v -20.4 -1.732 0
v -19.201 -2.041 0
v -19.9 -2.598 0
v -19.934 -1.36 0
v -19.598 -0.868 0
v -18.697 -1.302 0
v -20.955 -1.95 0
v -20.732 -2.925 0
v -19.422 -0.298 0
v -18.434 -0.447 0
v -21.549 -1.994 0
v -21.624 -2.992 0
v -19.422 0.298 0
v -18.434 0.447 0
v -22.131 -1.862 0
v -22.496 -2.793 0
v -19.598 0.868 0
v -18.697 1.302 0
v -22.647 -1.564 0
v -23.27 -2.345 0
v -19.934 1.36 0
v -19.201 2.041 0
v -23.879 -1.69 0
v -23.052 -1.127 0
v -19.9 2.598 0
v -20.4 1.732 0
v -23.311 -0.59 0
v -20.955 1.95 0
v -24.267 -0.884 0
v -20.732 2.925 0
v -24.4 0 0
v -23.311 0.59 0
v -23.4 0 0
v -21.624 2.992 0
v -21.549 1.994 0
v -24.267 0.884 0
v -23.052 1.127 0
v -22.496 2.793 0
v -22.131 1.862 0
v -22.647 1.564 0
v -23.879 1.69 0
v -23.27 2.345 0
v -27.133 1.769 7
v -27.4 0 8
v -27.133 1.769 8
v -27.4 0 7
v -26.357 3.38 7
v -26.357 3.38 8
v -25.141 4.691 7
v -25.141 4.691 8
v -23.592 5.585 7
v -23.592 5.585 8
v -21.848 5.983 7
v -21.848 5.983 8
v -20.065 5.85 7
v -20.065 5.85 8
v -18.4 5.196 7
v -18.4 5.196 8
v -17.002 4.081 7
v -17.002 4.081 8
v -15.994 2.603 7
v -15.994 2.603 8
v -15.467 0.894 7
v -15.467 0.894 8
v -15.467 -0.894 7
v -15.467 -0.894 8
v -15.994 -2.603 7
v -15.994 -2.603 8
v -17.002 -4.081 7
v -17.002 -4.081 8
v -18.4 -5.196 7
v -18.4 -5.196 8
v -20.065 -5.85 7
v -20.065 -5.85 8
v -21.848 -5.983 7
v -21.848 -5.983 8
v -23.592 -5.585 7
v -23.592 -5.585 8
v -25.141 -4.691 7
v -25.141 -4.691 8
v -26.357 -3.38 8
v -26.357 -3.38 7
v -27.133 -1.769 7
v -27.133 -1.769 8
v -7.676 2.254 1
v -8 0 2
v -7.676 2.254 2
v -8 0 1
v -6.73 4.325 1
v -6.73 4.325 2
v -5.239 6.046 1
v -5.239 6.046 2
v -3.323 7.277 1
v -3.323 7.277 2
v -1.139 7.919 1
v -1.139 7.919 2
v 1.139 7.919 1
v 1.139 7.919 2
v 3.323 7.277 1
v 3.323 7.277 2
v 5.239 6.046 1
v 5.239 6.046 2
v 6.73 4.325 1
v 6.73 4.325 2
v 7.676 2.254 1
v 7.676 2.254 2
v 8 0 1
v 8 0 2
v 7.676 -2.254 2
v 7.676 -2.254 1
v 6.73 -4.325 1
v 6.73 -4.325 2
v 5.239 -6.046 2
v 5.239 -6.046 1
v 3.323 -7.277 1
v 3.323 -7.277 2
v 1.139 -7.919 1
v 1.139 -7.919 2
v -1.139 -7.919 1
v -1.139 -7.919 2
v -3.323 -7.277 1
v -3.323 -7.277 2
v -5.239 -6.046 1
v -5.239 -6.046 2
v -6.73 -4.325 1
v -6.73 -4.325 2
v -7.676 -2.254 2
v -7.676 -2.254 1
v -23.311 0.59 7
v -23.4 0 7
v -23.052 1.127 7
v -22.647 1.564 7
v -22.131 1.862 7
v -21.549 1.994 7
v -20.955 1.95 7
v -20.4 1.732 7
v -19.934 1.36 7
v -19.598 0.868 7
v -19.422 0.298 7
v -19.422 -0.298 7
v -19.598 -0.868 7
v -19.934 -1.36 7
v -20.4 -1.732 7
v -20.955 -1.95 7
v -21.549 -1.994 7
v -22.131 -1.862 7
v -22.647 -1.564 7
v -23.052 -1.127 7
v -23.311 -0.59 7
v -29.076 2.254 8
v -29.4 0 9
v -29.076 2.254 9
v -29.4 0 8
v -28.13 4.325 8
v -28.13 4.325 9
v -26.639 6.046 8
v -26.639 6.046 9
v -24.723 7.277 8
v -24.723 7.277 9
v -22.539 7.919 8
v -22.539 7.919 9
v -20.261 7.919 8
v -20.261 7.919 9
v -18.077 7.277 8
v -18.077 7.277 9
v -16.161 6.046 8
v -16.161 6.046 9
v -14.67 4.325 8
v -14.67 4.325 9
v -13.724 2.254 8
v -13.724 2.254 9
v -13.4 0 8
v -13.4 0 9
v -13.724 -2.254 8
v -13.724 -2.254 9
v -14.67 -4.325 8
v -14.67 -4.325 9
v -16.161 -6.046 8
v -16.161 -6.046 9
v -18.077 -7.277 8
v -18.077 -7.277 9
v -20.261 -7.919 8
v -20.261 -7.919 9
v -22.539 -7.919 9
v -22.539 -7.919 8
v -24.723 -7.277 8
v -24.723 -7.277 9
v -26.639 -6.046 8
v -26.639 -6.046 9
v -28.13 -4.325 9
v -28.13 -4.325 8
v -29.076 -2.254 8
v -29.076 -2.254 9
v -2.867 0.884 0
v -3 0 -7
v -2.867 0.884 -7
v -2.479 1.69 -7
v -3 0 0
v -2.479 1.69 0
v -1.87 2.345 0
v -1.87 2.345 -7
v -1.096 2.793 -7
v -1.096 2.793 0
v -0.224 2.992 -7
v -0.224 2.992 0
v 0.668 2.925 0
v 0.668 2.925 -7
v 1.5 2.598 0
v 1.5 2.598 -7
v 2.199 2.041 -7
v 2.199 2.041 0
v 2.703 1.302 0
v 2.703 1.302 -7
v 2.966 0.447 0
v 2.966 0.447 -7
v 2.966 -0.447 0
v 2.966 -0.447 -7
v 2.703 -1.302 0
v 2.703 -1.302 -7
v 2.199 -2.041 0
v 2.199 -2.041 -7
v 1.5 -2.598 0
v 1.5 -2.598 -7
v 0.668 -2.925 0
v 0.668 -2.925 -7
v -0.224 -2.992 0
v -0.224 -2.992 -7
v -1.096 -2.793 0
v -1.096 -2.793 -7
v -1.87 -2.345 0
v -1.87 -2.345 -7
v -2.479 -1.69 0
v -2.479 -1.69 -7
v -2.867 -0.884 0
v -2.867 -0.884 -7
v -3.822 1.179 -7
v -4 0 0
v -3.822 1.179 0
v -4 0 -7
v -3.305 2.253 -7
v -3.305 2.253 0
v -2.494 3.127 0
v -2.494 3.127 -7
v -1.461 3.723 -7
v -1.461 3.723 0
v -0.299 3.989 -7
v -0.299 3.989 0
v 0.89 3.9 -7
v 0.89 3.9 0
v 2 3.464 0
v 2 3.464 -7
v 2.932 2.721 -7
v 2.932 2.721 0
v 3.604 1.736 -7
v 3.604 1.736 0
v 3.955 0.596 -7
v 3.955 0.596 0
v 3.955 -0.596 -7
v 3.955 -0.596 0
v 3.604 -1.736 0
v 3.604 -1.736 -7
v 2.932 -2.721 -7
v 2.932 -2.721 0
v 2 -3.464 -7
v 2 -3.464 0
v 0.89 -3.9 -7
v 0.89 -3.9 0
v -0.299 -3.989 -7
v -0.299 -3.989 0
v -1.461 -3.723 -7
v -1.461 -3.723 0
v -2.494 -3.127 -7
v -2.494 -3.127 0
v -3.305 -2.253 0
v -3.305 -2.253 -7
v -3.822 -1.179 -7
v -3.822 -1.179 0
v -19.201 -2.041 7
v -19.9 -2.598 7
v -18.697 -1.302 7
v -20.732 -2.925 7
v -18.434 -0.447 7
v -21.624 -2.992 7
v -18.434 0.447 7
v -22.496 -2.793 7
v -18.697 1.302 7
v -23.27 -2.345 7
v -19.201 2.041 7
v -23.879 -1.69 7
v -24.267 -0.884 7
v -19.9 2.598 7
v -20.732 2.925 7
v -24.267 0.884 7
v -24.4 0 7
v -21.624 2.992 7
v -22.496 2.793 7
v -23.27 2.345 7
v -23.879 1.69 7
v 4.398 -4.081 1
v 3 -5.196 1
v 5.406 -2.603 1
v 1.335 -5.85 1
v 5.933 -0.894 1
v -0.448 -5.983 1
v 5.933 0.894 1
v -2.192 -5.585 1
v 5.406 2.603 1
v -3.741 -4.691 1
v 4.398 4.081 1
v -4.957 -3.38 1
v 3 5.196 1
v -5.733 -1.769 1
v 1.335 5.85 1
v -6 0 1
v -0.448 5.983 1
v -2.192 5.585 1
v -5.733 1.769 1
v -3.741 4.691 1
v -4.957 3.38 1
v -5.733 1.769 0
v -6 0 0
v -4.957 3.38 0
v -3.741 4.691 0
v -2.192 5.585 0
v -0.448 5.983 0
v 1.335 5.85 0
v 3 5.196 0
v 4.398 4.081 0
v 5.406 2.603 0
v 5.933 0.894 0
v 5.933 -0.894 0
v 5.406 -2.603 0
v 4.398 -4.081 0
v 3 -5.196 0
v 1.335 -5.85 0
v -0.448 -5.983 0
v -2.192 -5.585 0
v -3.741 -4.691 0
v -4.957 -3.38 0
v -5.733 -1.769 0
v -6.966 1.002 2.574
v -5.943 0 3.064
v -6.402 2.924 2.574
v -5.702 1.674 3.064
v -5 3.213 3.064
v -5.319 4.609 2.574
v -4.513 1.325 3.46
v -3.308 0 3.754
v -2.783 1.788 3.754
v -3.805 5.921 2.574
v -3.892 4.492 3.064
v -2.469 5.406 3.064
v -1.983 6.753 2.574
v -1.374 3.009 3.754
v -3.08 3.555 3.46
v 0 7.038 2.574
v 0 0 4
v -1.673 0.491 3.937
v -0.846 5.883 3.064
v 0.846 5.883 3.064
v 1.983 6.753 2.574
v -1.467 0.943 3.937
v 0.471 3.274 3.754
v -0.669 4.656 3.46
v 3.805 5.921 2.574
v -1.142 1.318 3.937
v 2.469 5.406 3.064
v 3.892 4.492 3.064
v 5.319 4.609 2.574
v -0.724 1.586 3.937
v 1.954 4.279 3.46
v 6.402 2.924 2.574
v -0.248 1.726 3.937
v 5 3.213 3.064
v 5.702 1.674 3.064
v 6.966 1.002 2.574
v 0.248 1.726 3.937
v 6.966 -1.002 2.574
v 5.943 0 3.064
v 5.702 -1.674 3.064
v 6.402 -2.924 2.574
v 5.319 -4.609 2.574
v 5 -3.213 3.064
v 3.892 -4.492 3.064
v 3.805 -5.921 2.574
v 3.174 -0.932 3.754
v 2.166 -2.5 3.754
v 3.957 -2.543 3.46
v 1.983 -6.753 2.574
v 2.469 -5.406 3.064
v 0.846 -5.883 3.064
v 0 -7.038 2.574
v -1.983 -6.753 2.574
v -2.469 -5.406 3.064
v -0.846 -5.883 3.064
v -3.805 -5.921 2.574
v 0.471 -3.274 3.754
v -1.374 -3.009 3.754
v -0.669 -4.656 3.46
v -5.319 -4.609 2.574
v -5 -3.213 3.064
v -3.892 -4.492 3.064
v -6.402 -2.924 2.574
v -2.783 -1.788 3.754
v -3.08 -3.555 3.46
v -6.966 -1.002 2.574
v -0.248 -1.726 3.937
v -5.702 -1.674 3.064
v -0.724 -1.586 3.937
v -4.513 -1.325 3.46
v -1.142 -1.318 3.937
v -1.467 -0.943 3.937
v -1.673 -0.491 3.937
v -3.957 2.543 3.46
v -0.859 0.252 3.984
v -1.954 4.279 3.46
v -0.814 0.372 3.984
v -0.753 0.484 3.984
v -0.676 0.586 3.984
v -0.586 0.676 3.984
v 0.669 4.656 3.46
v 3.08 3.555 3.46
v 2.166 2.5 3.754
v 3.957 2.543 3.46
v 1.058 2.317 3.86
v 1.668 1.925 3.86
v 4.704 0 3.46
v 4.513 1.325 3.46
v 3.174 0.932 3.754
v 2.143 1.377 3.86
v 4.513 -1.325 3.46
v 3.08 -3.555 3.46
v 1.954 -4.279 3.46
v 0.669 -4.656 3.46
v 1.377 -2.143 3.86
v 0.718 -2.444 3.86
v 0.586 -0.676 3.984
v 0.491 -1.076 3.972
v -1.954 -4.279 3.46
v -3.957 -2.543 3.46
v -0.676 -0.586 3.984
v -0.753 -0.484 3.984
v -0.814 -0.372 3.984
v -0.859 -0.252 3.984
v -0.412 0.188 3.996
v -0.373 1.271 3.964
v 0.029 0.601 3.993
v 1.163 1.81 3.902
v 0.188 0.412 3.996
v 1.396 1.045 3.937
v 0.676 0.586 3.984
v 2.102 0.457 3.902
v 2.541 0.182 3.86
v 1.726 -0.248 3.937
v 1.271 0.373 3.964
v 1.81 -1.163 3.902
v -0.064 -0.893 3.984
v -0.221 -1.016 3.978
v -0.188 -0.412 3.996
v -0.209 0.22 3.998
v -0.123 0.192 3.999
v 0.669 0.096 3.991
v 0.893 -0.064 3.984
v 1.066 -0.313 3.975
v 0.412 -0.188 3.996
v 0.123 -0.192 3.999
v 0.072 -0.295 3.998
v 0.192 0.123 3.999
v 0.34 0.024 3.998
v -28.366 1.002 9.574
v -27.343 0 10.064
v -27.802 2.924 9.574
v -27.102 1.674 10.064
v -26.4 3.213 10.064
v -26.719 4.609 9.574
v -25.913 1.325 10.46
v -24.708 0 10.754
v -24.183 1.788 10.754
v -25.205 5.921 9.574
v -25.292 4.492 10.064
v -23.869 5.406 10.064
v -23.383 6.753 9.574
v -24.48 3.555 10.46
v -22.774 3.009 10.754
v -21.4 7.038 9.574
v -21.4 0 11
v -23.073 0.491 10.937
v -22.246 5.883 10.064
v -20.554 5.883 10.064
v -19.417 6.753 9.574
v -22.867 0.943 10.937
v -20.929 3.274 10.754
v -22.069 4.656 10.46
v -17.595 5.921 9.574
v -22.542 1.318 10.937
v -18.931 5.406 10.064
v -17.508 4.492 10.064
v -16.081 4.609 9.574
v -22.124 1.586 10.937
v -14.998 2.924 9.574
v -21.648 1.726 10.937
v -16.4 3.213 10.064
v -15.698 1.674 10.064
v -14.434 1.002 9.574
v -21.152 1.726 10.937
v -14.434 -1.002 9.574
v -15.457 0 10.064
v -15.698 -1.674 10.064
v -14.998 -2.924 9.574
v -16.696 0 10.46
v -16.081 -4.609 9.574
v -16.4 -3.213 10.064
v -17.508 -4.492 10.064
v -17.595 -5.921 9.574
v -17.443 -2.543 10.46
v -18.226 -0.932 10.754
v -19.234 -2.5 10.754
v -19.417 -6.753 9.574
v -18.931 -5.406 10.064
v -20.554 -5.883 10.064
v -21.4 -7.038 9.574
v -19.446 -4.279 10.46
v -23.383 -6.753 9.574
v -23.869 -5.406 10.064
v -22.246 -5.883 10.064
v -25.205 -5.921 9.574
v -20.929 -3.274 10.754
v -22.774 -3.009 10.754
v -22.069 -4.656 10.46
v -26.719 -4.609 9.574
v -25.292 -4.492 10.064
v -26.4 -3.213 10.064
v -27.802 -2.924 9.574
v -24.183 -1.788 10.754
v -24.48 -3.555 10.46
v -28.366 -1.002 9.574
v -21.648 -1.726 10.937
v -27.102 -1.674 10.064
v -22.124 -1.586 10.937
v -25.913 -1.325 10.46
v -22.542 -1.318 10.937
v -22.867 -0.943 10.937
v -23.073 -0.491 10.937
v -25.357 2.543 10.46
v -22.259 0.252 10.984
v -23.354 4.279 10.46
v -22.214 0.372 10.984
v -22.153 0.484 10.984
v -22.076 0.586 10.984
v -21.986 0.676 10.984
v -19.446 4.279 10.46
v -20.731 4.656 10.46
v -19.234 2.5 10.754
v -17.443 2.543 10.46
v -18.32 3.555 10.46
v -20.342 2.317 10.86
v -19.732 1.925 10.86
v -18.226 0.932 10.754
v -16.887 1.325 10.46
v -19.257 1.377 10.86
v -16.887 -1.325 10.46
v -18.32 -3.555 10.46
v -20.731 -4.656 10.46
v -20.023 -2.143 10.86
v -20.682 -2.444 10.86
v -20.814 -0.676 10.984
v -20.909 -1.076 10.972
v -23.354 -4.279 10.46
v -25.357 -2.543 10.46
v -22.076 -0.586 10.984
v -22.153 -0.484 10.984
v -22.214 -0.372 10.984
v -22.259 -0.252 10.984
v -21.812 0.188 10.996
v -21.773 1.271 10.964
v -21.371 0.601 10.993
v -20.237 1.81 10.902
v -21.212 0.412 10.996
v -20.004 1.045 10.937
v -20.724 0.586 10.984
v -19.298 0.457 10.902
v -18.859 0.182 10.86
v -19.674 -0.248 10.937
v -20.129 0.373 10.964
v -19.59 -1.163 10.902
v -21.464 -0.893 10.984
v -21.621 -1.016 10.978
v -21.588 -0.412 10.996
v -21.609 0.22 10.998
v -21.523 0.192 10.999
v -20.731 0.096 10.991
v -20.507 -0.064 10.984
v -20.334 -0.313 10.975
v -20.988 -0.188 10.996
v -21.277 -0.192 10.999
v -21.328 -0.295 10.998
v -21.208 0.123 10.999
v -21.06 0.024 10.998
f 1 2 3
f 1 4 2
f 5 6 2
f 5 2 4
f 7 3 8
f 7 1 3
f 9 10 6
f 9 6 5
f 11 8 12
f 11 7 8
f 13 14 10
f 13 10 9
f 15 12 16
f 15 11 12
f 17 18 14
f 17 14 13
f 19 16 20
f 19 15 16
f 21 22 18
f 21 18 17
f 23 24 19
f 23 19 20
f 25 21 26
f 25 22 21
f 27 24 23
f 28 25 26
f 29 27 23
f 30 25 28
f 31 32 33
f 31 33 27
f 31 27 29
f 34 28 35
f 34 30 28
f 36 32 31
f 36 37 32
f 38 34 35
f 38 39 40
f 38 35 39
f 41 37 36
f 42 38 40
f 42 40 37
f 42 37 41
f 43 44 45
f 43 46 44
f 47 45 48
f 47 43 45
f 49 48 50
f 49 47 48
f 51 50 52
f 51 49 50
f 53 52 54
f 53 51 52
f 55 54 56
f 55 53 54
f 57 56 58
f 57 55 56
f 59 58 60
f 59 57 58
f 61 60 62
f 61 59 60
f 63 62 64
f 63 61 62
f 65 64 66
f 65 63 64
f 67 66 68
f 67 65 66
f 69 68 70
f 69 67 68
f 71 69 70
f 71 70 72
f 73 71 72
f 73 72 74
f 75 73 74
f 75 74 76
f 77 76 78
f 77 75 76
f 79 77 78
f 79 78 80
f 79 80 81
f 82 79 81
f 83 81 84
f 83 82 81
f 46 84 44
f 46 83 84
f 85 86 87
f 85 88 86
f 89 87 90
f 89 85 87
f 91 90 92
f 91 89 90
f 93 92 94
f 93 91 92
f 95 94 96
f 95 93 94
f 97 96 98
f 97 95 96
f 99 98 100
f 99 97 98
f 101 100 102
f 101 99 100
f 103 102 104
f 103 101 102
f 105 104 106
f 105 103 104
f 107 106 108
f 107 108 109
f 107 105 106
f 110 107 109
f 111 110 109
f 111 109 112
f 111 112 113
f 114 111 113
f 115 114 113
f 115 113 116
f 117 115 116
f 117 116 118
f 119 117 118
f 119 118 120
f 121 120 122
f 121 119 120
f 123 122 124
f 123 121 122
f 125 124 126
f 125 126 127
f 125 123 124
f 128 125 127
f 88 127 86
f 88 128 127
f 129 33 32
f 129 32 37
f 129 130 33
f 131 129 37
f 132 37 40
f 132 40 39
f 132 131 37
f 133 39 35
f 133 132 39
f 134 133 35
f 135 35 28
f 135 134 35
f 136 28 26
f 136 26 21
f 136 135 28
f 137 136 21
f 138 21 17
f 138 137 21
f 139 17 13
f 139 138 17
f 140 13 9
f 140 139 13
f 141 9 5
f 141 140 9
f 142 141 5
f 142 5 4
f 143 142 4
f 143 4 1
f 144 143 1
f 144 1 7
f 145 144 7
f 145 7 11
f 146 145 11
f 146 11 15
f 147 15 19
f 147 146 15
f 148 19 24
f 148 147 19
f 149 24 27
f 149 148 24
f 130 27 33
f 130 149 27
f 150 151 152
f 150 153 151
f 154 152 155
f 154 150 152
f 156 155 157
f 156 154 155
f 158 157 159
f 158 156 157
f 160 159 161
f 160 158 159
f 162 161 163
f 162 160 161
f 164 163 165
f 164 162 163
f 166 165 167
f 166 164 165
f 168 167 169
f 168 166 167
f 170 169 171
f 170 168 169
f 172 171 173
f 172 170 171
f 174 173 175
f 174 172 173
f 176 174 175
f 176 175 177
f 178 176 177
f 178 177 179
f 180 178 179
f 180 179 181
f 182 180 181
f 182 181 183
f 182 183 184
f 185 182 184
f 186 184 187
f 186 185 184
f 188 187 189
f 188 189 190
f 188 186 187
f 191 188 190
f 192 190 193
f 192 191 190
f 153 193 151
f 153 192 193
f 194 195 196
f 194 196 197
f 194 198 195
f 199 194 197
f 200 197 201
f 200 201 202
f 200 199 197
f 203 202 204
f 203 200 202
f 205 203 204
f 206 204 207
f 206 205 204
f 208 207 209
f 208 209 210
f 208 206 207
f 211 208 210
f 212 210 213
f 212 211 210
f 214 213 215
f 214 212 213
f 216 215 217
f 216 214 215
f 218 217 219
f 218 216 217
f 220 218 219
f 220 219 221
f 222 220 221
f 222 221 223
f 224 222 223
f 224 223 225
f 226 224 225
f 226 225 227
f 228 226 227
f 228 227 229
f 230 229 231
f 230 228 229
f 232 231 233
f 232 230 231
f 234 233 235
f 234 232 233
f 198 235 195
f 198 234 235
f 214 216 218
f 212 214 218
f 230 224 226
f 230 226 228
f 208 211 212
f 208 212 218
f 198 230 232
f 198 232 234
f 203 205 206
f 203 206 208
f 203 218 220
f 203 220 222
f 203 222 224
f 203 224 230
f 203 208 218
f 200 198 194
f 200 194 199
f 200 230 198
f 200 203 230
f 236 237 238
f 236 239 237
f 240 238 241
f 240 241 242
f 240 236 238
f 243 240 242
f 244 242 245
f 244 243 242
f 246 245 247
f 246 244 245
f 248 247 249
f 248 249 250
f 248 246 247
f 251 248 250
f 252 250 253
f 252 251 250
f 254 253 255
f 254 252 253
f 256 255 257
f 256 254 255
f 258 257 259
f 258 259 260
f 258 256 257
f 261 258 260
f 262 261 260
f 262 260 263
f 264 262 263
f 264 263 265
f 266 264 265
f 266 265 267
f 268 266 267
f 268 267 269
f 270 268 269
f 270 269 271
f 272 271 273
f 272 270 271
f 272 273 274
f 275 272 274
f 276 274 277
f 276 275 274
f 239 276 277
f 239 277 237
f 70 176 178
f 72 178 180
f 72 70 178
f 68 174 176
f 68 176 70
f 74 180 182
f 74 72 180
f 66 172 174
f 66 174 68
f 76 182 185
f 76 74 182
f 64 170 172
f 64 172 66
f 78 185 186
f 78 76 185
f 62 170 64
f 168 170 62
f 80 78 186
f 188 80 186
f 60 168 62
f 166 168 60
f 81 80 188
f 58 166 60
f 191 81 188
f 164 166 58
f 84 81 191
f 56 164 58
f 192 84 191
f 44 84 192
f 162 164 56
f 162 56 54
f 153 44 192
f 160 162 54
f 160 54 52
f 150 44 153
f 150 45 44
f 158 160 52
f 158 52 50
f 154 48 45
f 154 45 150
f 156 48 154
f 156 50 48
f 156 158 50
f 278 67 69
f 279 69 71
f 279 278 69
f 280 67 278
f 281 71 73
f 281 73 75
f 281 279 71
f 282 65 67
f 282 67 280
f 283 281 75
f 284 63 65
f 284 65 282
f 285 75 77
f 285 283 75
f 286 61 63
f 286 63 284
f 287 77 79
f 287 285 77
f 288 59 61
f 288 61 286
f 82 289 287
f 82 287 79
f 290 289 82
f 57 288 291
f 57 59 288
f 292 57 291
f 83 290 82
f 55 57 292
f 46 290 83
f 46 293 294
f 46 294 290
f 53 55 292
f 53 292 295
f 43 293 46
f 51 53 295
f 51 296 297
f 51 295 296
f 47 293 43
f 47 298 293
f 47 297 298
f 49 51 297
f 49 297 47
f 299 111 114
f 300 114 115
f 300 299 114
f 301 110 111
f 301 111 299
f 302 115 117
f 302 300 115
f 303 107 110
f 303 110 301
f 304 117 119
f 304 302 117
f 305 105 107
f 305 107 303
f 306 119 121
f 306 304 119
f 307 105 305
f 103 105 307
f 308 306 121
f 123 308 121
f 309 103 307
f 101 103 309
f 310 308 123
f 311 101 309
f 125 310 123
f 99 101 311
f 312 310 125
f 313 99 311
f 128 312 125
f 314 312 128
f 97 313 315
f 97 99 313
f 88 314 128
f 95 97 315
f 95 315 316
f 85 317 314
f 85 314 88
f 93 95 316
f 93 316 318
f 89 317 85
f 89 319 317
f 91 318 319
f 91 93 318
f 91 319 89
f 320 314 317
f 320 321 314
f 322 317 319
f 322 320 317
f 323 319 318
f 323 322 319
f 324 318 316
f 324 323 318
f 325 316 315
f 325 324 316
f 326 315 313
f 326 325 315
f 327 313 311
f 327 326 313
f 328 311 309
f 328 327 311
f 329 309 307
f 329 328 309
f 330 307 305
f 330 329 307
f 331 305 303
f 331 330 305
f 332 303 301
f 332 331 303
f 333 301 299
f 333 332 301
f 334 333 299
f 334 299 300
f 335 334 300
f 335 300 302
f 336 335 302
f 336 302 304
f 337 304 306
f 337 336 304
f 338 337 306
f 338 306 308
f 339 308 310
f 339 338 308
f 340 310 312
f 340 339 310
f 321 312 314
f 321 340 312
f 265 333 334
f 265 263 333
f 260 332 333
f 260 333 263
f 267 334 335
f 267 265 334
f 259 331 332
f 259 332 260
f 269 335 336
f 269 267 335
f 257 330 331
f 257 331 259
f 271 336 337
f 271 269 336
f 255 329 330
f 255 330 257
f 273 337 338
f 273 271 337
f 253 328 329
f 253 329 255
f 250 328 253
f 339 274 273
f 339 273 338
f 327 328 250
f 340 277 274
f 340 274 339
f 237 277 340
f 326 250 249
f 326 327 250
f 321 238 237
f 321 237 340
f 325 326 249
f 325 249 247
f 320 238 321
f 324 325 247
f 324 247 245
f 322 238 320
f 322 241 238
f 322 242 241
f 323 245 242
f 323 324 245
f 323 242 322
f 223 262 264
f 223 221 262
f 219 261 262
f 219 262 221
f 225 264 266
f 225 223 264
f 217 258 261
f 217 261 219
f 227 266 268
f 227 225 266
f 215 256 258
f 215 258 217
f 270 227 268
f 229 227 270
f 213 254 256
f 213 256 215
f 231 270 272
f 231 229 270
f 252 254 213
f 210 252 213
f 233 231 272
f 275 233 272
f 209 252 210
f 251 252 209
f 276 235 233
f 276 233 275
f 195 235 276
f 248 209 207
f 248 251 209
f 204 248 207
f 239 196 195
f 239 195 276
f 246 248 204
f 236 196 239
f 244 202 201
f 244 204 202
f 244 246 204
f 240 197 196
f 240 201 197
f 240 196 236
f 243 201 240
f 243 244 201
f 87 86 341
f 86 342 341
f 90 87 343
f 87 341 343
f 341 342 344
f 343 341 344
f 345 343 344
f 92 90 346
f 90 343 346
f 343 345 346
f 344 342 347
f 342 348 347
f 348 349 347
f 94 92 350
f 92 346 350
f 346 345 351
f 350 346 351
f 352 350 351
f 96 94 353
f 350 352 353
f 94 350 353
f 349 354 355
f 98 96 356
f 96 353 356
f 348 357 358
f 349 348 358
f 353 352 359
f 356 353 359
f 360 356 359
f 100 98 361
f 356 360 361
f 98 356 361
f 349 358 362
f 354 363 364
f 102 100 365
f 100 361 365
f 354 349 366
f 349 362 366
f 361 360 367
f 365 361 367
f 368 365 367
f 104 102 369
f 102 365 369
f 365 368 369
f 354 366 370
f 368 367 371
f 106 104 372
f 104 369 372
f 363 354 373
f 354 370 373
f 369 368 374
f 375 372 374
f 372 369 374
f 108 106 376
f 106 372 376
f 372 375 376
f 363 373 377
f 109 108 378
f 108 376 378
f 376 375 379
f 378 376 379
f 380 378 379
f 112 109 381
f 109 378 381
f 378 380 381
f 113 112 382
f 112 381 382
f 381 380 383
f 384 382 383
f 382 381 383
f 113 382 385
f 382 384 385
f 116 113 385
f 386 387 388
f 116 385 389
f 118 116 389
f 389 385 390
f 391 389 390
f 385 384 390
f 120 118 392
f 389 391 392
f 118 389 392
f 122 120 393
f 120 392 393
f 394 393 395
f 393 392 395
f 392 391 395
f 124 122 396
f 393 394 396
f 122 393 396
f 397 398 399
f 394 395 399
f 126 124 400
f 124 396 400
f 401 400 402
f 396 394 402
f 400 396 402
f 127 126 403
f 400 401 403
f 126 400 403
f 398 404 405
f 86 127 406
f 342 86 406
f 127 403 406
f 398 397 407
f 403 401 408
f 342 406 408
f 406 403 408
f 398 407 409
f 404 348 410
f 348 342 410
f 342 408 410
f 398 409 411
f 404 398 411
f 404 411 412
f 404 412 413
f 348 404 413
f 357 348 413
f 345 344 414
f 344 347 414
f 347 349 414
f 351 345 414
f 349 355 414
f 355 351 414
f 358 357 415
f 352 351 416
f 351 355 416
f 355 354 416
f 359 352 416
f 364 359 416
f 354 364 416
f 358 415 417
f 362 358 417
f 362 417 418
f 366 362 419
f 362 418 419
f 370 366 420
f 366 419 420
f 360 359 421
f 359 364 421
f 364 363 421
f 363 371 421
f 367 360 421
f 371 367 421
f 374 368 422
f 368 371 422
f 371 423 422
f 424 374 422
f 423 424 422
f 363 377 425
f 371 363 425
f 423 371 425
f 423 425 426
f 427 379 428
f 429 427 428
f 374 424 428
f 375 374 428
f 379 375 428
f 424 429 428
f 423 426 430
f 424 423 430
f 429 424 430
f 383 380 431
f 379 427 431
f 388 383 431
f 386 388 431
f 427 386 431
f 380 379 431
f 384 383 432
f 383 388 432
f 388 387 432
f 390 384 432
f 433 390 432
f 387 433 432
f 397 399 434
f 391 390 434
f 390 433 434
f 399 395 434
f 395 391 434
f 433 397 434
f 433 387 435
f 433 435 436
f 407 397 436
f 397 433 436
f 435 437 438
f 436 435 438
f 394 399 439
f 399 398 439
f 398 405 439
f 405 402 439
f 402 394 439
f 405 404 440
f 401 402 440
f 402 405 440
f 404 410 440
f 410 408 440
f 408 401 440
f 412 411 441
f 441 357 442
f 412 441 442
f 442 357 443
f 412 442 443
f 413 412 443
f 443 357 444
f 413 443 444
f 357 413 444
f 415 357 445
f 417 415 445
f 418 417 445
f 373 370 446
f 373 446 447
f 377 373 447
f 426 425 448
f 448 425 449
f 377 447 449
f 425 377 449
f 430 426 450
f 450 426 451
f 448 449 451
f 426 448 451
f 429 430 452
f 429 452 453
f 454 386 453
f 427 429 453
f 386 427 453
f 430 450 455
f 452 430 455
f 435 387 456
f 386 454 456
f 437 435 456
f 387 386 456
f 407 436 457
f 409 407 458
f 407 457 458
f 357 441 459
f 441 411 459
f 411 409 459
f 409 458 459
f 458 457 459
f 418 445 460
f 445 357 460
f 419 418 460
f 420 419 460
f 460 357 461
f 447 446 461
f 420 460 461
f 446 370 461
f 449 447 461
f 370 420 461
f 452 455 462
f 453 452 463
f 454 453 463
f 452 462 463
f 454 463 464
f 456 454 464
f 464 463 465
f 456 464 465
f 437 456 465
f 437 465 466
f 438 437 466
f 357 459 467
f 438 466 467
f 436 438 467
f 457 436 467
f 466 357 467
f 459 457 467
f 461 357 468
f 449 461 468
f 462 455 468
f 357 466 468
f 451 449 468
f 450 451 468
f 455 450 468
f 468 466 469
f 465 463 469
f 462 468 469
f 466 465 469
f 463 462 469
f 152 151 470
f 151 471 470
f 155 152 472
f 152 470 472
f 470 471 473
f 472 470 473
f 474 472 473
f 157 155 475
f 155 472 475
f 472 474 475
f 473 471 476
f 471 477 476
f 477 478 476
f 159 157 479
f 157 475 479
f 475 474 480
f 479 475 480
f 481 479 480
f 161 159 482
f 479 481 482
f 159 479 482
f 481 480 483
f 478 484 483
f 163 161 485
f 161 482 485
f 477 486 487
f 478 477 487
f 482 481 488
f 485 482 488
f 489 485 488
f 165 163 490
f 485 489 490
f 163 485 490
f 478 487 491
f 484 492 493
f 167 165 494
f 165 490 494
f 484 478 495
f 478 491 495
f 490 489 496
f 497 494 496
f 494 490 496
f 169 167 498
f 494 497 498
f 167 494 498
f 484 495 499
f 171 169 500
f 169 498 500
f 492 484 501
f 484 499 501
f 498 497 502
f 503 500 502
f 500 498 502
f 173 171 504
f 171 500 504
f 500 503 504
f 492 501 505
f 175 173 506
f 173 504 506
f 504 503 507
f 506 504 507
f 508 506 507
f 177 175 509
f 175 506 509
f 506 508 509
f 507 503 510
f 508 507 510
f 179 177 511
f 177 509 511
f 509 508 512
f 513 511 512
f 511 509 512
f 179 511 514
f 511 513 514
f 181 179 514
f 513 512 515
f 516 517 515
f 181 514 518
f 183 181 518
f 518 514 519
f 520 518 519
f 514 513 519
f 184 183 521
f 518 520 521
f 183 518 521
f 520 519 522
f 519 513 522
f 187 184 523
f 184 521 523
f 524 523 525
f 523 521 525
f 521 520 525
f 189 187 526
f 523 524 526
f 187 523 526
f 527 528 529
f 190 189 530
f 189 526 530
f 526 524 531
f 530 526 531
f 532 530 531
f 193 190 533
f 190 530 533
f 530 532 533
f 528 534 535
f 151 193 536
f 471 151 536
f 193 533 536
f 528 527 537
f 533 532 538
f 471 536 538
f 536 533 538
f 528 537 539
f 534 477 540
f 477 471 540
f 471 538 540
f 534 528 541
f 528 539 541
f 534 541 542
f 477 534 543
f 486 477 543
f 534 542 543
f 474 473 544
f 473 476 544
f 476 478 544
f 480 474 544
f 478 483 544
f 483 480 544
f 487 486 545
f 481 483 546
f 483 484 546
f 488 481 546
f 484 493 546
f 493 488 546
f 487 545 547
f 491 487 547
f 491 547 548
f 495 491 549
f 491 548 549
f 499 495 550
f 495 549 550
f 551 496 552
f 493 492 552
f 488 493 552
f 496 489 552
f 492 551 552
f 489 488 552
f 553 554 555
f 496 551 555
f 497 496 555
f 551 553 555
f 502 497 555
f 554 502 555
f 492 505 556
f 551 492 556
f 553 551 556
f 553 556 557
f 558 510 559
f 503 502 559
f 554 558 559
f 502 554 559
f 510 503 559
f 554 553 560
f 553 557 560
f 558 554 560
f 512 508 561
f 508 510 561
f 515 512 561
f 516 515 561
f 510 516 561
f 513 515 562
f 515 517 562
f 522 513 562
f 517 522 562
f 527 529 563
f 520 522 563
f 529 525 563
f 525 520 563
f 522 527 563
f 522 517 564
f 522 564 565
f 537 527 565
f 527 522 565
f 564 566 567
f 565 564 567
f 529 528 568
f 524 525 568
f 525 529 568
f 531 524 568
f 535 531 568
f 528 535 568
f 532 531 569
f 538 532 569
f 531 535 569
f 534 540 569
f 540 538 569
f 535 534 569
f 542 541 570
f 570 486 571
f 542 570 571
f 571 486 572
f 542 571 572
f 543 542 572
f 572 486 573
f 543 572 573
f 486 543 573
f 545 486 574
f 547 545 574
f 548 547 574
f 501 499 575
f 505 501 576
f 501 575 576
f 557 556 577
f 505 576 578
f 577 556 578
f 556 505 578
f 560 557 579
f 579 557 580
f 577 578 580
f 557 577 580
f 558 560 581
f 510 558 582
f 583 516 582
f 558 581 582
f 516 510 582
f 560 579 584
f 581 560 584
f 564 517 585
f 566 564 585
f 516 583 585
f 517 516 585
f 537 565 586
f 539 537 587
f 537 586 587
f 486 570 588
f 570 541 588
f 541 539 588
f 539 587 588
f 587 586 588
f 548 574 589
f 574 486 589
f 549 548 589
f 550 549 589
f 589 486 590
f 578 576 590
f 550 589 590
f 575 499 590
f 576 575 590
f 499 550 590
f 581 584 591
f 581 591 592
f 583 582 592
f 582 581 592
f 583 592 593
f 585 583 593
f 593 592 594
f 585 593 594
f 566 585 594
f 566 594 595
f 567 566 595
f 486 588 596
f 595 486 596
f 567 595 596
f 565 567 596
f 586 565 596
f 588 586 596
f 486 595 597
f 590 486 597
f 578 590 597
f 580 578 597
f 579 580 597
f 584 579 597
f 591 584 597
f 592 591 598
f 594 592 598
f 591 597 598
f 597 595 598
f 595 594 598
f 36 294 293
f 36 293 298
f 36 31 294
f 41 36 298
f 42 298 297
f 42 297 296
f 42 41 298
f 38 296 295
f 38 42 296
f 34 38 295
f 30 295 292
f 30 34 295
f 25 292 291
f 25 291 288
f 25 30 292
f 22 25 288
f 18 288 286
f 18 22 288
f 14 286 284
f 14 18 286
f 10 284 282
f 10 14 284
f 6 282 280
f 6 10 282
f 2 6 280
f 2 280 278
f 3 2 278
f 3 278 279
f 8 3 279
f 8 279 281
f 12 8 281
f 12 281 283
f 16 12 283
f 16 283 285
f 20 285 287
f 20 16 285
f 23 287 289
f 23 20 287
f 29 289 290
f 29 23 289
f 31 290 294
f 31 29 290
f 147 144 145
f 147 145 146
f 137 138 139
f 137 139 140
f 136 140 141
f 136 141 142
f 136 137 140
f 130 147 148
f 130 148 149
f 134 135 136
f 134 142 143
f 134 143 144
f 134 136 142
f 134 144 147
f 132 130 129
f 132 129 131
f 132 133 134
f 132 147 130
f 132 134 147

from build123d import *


with BuildPart() as f1:
    # F0 (on Front) → F1 (revolve)
    with BuildSketch(Plane.XZ):
        with BuildLine():
            Line((0, 0), (0, 4))
            add(Edge.make_bspline(
                [(-8, 2), (-6.2015, 3.226357), (-3.674635, 4), (0, 4)],
                knots=[0, 0, 0, 0, 8.246211, 8.246211, 8.246211, 8.246211], degree=3))
            Line((-8, 2), (-8, 1))
            Line((-8, 1), (-6, 1))
            Line((-6, 1), (-6, 0))
            Line((-6, 0), (-4, 0))
            Line((-4, 0), (-4, -7))
            Line((-4, -7), (-3, -7))
            Line((-3, -7), (-3, 0))
            Line((-3, 0), (0, 0))
        make_face()
    revolve(axis=Axis((0, 0, 2), (0, 0, -1)))


with BuildPart() as f3:
    # F2 (on Front) → F3 (revolve)
    with BuildSketch(Plane.XZ):
        with BuildLine():
            Line((-21.399998, 7), (-21.399998, 11))
            add(Edge.make_bspline(
                [(-29.399998, 9), (-27.601498, 10.226357), (-25.074633, 11), (-21.399998, 11)],
                knots=[0, 0, 0, 0, 8.246211, 8.246211, 8.246211, 8.246211], degree=3))
            Line((-29.399998, 9), (-29.399998, 8))
            Line((-29.399998, 8), (-27.399998, 8))
            Line((-27.399998, 8), (-27.399998, 7))
            Line((-27.399998, 7), (-24.399998, 7))
            Line((-24.399998, 7), (-24.399998, 0))
            Line((-24.399998, 0), (-23.399998, 0))
            Line((-23.399998, 0), (-23.399998, 7))
            Line((-23.399998, 7), (-21.399998, 7))
        make_face()
    revolve(axis=Axis((-21.399998, 0, 9), (0, 0, -1)))


solid = Compound([f1.part, f3.part])
